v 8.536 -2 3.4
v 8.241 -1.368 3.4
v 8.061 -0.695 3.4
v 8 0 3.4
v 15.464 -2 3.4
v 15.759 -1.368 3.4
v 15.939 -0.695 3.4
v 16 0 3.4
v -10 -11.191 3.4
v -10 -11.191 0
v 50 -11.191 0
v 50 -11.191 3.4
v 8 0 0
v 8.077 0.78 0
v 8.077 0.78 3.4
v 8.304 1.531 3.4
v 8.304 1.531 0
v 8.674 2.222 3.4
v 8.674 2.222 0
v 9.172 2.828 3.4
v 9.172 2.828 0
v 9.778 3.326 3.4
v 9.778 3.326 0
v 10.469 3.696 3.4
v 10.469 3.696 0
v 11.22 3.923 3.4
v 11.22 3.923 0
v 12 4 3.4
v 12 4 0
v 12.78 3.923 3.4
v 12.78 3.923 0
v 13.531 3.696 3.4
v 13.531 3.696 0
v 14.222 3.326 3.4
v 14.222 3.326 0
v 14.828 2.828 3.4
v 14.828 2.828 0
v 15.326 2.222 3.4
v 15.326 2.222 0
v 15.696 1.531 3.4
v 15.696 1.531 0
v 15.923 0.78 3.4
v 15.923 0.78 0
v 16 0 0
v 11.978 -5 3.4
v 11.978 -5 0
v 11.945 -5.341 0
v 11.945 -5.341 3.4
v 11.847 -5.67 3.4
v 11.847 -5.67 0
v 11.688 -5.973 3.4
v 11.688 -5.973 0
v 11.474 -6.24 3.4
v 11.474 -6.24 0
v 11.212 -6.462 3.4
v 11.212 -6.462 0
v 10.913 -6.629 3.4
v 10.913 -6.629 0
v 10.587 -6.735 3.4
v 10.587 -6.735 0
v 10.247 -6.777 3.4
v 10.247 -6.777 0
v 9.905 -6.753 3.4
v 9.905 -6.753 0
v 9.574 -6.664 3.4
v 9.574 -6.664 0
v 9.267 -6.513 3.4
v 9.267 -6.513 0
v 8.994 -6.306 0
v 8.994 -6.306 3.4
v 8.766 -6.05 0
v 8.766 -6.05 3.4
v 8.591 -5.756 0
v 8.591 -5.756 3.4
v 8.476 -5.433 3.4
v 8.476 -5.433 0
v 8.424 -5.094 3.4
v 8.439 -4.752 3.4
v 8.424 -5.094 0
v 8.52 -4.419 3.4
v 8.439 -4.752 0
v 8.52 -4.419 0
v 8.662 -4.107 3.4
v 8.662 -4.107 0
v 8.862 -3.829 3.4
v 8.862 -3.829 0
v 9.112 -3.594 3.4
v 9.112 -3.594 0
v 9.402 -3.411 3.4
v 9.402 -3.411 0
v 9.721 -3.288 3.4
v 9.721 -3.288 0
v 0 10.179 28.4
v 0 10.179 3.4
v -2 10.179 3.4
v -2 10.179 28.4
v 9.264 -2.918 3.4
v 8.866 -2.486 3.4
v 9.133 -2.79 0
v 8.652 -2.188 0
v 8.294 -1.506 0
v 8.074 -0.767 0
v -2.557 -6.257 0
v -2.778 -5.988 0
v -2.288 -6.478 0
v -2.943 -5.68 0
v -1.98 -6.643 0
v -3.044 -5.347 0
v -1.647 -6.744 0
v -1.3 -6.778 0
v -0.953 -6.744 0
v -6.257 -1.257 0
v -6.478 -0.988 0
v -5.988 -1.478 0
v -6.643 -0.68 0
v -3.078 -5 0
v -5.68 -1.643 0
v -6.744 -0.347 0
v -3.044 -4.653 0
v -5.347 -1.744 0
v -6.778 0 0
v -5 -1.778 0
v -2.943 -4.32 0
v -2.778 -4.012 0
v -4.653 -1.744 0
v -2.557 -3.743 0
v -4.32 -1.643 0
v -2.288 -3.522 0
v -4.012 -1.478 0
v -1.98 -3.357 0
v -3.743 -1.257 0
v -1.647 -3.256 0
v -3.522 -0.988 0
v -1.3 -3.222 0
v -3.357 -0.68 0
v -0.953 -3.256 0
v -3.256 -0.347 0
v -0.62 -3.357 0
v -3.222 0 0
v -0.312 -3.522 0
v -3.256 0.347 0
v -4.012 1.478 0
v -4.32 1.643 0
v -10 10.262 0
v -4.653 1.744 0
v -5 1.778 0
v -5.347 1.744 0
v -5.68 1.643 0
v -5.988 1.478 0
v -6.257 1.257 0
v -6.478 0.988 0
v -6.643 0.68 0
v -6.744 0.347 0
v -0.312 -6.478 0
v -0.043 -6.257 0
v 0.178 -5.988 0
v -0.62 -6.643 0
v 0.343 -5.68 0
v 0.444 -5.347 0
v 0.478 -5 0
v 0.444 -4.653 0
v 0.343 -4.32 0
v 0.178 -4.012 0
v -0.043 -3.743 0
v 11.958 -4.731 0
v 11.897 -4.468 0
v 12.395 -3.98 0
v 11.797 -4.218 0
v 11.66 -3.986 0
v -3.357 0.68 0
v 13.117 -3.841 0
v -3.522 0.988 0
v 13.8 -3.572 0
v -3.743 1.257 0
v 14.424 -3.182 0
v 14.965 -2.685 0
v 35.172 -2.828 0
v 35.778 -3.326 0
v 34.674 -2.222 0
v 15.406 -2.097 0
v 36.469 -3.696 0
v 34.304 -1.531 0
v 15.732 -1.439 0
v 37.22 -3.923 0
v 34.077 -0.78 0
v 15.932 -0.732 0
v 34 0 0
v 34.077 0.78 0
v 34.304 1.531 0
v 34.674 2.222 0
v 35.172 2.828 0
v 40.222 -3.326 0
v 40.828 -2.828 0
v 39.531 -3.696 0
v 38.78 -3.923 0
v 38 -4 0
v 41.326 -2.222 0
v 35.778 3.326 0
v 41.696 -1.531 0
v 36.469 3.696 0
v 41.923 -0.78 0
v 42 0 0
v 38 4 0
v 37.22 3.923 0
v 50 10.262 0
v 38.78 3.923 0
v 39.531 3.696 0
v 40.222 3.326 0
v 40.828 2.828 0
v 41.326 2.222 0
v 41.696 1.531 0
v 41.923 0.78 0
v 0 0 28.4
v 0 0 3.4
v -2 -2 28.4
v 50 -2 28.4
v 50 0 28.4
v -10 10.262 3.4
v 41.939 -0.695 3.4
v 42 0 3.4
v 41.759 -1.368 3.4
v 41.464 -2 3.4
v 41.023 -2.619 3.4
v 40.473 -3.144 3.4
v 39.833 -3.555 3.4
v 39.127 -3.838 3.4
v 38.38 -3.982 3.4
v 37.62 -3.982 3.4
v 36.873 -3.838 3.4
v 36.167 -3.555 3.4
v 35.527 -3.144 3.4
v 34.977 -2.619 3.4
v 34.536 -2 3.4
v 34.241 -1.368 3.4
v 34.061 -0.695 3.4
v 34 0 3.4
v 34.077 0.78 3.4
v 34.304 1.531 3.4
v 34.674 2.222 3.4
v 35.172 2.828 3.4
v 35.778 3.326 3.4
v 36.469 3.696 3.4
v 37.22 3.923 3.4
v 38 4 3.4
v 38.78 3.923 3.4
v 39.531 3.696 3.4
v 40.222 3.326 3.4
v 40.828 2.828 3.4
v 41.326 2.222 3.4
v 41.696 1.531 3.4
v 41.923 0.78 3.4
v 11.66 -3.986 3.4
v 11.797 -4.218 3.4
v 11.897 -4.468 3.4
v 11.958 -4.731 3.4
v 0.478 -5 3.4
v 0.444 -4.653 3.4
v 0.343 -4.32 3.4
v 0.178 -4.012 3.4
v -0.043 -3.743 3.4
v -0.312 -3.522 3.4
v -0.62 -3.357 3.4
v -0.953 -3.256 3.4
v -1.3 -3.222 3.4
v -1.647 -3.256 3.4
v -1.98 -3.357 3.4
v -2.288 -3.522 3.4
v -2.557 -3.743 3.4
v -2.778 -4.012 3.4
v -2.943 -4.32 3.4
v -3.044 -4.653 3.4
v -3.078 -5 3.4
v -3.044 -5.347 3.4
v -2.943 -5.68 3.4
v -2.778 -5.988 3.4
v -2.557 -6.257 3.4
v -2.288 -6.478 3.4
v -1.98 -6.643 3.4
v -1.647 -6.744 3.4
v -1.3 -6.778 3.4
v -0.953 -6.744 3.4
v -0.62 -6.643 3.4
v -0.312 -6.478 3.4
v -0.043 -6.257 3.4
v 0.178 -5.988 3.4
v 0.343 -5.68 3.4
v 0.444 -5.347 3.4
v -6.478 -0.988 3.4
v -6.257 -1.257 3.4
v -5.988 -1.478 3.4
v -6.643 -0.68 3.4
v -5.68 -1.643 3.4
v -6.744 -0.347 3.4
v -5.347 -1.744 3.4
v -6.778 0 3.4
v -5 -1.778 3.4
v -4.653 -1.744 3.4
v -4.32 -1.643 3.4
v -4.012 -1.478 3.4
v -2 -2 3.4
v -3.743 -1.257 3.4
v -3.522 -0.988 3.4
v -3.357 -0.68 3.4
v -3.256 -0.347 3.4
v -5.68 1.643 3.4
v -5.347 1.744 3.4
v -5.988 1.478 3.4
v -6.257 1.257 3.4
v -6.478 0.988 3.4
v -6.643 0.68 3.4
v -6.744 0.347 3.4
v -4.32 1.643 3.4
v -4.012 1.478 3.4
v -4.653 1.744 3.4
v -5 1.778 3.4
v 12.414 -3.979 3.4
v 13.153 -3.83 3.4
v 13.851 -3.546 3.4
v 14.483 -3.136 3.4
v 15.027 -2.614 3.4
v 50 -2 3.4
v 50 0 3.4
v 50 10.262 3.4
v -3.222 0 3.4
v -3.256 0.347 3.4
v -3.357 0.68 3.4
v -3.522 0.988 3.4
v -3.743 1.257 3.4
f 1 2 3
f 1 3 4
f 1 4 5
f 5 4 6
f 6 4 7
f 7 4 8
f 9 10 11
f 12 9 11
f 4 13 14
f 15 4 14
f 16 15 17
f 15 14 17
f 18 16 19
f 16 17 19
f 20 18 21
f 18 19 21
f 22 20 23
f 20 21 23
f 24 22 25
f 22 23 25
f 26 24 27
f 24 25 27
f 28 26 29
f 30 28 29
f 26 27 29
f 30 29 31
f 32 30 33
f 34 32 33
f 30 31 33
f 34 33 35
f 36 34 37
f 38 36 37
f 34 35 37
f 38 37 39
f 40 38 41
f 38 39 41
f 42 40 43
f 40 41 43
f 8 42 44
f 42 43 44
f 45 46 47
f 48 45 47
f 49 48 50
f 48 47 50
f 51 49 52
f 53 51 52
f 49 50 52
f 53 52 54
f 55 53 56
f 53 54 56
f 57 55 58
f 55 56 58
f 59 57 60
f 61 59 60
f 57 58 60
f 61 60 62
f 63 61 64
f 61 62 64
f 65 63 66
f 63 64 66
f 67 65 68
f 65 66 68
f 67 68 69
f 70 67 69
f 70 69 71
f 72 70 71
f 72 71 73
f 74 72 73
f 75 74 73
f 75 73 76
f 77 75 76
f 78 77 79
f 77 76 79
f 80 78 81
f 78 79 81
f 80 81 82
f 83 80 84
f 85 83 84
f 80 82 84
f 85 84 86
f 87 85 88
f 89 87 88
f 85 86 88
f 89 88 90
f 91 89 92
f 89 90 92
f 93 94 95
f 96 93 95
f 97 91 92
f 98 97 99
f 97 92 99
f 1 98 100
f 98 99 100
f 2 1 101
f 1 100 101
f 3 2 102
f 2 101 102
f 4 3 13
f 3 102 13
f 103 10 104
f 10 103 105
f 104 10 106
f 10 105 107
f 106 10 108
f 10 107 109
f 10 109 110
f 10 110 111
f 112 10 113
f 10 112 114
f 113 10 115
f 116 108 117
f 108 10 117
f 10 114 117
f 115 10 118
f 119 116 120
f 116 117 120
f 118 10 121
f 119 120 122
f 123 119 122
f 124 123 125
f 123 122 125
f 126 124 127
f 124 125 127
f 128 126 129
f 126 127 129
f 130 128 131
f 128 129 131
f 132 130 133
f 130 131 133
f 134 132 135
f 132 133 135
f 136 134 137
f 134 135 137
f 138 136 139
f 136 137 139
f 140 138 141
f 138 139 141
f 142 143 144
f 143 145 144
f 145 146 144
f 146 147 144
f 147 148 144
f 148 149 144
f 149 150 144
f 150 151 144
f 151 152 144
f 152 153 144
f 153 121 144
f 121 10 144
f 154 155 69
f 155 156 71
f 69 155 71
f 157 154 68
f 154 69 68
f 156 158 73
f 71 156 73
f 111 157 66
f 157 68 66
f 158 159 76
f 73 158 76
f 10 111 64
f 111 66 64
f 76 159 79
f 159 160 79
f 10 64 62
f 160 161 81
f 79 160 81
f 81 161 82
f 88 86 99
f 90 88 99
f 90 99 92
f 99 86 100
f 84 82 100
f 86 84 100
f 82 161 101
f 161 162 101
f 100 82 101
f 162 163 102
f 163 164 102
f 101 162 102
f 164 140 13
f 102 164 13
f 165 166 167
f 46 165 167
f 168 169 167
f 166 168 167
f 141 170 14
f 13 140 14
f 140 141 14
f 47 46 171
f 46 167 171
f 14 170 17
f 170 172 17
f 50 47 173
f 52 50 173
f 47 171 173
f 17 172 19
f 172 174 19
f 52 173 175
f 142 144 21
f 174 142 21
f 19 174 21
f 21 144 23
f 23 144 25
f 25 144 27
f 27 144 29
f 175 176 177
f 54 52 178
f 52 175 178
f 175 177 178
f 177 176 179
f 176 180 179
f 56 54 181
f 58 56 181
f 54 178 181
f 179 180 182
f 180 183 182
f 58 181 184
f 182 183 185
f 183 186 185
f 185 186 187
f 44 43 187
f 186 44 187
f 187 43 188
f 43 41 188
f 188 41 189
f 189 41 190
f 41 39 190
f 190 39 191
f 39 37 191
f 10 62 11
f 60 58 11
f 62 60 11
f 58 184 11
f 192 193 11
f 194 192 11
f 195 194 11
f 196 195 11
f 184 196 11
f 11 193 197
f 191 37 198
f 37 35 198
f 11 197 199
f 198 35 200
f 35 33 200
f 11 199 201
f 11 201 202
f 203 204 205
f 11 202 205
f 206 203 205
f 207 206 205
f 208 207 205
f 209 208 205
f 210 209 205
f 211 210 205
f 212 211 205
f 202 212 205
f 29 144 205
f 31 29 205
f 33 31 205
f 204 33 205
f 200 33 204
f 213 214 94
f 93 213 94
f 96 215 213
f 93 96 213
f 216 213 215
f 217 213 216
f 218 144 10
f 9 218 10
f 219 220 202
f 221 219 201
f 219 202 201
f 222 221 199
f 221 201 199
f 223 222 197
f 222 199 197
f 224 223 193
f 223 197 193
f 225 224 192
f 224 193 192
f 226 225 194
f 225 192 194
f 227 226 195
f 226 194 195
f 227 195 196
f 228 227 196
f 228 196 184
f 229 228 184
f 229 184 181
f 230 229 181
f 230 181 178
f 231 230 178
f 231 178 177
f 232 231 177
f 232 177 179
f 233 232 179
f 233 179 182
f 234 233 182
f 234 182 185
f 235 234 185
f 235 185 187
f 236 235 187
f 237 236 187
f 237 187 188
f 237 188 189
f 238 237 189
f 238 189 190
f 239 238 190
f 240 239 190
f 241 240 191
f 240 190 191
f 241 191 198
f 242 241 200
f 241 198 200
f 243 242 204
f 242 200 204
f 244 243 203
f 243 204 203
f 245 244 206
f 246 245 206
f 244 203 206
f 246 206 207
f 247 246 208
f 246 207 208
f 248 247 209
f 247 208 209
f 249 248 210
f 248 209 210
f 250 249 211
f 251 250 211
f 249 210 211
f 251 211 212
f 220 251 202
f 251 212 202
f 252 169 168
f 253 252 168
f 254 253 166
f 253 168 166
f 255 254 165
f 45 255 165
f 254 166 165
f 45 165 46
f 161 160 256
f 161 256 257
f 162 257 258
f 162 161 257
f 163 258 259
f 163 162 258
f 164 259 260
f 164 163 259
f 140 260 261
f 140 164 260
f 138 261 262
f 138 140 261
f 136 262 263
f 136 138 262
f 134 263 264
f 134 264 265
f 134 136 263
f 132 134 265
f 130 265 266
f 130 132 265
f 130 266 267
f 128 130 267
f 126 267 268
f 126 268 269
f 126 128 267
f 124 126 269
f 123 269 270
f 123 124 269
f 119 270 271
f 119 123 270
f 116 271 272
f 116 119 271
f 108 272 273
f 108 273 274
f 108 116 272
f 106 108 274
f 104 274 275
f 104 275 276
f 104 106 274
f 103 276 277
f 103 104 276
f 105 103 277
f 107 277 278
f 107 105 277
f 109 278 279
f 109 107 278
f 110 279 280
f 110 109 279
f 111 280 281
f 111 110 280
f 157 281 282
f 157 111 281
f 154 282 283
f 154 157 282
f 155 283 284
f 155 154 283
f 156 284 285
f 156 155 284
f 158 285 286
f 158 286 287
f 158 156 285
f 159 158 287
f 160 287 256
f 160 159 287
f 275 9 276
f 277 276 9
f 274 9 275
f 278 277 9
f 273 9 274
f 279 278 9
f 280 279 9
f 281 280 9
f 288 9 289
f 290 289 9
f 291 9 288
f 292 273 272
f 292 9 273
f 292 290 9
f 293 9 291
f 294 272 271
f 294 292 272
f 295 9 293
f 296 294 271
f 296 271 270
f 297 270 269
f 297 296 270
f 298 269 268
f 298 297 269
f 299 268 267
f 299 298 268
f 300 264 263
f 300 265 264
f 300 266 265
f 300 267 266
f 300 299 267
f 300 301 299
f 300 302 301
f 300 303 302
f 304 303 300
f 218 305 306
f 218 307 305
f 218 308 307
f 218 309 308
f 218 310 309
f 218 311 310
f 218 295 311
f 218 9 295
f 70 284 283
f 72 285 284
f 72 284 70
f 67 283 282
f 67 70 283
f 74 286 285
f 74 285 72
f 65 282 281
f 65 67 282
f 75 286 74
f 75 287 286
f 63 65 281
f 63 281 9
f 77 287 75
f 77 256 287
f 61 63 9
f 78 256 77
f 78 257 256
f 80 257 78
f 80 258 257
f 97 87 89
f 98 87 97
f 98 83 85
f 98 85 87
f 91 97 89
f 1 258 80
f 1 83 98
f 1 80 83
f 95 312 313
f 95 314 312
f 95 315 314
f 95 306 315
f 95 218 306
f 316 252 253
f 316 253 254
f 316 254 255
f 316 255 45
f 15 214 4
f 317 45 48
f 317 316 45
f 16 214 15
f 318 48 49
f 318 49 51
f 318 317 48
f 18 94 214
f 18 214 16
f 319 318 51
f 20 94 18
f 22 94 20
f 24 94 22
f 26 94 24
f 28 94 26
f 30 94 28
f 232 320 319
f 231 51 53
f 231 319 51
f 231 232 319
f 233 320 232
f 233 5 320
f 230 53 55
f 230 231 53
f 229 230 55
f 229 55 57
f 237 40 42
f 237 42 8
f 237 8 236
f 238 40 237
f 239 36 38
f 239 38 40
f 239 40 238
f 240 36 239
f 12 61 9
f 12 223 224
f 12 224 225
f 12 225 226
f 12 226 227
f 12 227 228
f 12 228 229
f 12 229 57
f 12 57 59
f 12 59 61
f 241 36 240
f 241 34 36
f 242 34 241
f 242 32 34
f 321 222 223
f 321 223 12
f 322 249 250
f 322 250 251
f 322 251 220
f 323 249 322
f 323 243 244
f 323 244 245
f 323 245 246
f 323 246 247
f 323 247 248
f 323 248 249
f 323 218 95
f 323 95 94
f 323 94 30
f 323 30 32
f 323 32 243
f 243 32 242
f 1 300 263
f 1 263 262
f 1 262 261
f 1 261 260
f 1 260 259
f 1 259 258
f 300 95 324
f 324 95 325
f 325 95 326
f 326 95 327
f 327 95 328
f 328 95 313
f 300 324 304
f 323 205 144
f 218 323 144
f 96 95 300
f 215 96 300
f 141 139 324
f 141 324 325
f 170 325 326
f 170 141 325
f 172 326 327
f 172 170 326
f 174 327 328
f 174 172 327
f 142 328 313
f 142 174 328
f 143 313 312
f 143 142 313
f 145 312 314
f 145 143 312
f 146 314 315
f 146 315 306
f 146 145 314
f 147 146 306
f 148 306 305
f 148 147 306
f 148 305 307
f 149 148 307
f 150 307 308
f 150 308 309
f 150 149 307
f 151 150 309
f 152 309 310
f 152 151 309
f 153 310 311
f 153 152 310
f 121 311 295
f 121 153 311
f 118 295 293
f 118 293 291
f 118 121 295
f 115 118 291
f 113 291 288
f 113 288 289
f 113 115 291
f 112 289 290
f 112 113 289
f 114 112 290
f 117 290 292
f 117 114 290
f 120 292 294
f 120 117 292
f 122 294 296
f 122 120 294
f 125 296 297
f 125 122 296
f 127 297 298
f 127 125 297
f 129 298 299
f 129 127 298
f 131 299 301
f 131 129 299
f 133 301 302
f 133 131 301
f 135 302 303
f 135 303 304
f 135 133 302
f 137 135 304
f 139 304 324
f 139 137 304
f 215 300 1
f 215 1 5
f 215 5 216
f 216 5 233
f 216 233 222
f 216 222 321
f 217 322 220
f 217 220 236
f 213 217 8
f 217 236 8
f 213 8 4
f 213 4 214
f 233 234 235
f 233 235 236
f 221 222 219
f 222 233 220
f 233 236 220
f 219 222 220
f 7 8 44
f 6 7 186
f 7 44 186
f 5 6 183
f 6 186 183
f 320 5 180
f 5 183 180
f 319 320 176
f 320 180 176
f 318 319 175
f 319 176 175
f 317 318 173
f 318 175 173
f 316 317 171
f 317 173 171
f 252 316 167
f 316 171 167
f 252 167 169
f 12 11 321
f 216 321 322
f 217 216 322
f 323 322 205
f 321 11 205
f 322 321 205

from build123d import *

# Parameters (mm, degrees)
F0_R     = 1.778
F1_DEPTH = 3.4
F4_DEPTH = 25


with BuildPart() as f1:
    # F0 (on Top) → F1 (new body)
    with BuildSketch(Plane.XY):
        Polygon((50, 10.261858), (0, 10.261858), (-10, 10.261858), (-10, -11.191153), (50, -11.191153), (50, 0), align=None)
        with Locations((-1.3, -5)):
            Circle(F0_R, mode=Mode.SUBTRACT)
        with BuildLine():
            ThreePointArc((8, 0), (12, 4), (16, 0))
            ThreePointArc((16, 0), (14.70562, -2.946119), (11.66019, -3.98554))
            ThreePointArc((11.66019, -3.98554), (11.896688, -4.468462), (11.978, -5))
            ThreePointArc((11.978, -5), (9.125181, -6.41635), (9.721478, -3.287604))
            ThreePointArc((9.721478, -3.287604), (8.456408, -1.855521), (8, 0))
        make_face(mode=Mode.SUBTRACT)
        with Locations((-5, 0)):
            Circle(F0_R, mode=Mode.SUBTRACT)
        with BuildLine():
            ThreePointArc((34, 0), (38, 4), (42, 0))
            ThreePointArc((42, 0), (38, -4), (34, 0))
        make_face(mode=Mode.SUBTRACT)
    extrude(amount=F1_DEPTH)

    # F3 (on face) → F4 (join)
    with BuildSketch(Plane.XY.offset(3.4)):
        Polygon((50, 0), (0, 0), (0, 10.178791), (-2, 10.178791), (-2, -2), (50, -2), align=None)
    extrude(amount=F4_DEPTH)


solid = f1.part
